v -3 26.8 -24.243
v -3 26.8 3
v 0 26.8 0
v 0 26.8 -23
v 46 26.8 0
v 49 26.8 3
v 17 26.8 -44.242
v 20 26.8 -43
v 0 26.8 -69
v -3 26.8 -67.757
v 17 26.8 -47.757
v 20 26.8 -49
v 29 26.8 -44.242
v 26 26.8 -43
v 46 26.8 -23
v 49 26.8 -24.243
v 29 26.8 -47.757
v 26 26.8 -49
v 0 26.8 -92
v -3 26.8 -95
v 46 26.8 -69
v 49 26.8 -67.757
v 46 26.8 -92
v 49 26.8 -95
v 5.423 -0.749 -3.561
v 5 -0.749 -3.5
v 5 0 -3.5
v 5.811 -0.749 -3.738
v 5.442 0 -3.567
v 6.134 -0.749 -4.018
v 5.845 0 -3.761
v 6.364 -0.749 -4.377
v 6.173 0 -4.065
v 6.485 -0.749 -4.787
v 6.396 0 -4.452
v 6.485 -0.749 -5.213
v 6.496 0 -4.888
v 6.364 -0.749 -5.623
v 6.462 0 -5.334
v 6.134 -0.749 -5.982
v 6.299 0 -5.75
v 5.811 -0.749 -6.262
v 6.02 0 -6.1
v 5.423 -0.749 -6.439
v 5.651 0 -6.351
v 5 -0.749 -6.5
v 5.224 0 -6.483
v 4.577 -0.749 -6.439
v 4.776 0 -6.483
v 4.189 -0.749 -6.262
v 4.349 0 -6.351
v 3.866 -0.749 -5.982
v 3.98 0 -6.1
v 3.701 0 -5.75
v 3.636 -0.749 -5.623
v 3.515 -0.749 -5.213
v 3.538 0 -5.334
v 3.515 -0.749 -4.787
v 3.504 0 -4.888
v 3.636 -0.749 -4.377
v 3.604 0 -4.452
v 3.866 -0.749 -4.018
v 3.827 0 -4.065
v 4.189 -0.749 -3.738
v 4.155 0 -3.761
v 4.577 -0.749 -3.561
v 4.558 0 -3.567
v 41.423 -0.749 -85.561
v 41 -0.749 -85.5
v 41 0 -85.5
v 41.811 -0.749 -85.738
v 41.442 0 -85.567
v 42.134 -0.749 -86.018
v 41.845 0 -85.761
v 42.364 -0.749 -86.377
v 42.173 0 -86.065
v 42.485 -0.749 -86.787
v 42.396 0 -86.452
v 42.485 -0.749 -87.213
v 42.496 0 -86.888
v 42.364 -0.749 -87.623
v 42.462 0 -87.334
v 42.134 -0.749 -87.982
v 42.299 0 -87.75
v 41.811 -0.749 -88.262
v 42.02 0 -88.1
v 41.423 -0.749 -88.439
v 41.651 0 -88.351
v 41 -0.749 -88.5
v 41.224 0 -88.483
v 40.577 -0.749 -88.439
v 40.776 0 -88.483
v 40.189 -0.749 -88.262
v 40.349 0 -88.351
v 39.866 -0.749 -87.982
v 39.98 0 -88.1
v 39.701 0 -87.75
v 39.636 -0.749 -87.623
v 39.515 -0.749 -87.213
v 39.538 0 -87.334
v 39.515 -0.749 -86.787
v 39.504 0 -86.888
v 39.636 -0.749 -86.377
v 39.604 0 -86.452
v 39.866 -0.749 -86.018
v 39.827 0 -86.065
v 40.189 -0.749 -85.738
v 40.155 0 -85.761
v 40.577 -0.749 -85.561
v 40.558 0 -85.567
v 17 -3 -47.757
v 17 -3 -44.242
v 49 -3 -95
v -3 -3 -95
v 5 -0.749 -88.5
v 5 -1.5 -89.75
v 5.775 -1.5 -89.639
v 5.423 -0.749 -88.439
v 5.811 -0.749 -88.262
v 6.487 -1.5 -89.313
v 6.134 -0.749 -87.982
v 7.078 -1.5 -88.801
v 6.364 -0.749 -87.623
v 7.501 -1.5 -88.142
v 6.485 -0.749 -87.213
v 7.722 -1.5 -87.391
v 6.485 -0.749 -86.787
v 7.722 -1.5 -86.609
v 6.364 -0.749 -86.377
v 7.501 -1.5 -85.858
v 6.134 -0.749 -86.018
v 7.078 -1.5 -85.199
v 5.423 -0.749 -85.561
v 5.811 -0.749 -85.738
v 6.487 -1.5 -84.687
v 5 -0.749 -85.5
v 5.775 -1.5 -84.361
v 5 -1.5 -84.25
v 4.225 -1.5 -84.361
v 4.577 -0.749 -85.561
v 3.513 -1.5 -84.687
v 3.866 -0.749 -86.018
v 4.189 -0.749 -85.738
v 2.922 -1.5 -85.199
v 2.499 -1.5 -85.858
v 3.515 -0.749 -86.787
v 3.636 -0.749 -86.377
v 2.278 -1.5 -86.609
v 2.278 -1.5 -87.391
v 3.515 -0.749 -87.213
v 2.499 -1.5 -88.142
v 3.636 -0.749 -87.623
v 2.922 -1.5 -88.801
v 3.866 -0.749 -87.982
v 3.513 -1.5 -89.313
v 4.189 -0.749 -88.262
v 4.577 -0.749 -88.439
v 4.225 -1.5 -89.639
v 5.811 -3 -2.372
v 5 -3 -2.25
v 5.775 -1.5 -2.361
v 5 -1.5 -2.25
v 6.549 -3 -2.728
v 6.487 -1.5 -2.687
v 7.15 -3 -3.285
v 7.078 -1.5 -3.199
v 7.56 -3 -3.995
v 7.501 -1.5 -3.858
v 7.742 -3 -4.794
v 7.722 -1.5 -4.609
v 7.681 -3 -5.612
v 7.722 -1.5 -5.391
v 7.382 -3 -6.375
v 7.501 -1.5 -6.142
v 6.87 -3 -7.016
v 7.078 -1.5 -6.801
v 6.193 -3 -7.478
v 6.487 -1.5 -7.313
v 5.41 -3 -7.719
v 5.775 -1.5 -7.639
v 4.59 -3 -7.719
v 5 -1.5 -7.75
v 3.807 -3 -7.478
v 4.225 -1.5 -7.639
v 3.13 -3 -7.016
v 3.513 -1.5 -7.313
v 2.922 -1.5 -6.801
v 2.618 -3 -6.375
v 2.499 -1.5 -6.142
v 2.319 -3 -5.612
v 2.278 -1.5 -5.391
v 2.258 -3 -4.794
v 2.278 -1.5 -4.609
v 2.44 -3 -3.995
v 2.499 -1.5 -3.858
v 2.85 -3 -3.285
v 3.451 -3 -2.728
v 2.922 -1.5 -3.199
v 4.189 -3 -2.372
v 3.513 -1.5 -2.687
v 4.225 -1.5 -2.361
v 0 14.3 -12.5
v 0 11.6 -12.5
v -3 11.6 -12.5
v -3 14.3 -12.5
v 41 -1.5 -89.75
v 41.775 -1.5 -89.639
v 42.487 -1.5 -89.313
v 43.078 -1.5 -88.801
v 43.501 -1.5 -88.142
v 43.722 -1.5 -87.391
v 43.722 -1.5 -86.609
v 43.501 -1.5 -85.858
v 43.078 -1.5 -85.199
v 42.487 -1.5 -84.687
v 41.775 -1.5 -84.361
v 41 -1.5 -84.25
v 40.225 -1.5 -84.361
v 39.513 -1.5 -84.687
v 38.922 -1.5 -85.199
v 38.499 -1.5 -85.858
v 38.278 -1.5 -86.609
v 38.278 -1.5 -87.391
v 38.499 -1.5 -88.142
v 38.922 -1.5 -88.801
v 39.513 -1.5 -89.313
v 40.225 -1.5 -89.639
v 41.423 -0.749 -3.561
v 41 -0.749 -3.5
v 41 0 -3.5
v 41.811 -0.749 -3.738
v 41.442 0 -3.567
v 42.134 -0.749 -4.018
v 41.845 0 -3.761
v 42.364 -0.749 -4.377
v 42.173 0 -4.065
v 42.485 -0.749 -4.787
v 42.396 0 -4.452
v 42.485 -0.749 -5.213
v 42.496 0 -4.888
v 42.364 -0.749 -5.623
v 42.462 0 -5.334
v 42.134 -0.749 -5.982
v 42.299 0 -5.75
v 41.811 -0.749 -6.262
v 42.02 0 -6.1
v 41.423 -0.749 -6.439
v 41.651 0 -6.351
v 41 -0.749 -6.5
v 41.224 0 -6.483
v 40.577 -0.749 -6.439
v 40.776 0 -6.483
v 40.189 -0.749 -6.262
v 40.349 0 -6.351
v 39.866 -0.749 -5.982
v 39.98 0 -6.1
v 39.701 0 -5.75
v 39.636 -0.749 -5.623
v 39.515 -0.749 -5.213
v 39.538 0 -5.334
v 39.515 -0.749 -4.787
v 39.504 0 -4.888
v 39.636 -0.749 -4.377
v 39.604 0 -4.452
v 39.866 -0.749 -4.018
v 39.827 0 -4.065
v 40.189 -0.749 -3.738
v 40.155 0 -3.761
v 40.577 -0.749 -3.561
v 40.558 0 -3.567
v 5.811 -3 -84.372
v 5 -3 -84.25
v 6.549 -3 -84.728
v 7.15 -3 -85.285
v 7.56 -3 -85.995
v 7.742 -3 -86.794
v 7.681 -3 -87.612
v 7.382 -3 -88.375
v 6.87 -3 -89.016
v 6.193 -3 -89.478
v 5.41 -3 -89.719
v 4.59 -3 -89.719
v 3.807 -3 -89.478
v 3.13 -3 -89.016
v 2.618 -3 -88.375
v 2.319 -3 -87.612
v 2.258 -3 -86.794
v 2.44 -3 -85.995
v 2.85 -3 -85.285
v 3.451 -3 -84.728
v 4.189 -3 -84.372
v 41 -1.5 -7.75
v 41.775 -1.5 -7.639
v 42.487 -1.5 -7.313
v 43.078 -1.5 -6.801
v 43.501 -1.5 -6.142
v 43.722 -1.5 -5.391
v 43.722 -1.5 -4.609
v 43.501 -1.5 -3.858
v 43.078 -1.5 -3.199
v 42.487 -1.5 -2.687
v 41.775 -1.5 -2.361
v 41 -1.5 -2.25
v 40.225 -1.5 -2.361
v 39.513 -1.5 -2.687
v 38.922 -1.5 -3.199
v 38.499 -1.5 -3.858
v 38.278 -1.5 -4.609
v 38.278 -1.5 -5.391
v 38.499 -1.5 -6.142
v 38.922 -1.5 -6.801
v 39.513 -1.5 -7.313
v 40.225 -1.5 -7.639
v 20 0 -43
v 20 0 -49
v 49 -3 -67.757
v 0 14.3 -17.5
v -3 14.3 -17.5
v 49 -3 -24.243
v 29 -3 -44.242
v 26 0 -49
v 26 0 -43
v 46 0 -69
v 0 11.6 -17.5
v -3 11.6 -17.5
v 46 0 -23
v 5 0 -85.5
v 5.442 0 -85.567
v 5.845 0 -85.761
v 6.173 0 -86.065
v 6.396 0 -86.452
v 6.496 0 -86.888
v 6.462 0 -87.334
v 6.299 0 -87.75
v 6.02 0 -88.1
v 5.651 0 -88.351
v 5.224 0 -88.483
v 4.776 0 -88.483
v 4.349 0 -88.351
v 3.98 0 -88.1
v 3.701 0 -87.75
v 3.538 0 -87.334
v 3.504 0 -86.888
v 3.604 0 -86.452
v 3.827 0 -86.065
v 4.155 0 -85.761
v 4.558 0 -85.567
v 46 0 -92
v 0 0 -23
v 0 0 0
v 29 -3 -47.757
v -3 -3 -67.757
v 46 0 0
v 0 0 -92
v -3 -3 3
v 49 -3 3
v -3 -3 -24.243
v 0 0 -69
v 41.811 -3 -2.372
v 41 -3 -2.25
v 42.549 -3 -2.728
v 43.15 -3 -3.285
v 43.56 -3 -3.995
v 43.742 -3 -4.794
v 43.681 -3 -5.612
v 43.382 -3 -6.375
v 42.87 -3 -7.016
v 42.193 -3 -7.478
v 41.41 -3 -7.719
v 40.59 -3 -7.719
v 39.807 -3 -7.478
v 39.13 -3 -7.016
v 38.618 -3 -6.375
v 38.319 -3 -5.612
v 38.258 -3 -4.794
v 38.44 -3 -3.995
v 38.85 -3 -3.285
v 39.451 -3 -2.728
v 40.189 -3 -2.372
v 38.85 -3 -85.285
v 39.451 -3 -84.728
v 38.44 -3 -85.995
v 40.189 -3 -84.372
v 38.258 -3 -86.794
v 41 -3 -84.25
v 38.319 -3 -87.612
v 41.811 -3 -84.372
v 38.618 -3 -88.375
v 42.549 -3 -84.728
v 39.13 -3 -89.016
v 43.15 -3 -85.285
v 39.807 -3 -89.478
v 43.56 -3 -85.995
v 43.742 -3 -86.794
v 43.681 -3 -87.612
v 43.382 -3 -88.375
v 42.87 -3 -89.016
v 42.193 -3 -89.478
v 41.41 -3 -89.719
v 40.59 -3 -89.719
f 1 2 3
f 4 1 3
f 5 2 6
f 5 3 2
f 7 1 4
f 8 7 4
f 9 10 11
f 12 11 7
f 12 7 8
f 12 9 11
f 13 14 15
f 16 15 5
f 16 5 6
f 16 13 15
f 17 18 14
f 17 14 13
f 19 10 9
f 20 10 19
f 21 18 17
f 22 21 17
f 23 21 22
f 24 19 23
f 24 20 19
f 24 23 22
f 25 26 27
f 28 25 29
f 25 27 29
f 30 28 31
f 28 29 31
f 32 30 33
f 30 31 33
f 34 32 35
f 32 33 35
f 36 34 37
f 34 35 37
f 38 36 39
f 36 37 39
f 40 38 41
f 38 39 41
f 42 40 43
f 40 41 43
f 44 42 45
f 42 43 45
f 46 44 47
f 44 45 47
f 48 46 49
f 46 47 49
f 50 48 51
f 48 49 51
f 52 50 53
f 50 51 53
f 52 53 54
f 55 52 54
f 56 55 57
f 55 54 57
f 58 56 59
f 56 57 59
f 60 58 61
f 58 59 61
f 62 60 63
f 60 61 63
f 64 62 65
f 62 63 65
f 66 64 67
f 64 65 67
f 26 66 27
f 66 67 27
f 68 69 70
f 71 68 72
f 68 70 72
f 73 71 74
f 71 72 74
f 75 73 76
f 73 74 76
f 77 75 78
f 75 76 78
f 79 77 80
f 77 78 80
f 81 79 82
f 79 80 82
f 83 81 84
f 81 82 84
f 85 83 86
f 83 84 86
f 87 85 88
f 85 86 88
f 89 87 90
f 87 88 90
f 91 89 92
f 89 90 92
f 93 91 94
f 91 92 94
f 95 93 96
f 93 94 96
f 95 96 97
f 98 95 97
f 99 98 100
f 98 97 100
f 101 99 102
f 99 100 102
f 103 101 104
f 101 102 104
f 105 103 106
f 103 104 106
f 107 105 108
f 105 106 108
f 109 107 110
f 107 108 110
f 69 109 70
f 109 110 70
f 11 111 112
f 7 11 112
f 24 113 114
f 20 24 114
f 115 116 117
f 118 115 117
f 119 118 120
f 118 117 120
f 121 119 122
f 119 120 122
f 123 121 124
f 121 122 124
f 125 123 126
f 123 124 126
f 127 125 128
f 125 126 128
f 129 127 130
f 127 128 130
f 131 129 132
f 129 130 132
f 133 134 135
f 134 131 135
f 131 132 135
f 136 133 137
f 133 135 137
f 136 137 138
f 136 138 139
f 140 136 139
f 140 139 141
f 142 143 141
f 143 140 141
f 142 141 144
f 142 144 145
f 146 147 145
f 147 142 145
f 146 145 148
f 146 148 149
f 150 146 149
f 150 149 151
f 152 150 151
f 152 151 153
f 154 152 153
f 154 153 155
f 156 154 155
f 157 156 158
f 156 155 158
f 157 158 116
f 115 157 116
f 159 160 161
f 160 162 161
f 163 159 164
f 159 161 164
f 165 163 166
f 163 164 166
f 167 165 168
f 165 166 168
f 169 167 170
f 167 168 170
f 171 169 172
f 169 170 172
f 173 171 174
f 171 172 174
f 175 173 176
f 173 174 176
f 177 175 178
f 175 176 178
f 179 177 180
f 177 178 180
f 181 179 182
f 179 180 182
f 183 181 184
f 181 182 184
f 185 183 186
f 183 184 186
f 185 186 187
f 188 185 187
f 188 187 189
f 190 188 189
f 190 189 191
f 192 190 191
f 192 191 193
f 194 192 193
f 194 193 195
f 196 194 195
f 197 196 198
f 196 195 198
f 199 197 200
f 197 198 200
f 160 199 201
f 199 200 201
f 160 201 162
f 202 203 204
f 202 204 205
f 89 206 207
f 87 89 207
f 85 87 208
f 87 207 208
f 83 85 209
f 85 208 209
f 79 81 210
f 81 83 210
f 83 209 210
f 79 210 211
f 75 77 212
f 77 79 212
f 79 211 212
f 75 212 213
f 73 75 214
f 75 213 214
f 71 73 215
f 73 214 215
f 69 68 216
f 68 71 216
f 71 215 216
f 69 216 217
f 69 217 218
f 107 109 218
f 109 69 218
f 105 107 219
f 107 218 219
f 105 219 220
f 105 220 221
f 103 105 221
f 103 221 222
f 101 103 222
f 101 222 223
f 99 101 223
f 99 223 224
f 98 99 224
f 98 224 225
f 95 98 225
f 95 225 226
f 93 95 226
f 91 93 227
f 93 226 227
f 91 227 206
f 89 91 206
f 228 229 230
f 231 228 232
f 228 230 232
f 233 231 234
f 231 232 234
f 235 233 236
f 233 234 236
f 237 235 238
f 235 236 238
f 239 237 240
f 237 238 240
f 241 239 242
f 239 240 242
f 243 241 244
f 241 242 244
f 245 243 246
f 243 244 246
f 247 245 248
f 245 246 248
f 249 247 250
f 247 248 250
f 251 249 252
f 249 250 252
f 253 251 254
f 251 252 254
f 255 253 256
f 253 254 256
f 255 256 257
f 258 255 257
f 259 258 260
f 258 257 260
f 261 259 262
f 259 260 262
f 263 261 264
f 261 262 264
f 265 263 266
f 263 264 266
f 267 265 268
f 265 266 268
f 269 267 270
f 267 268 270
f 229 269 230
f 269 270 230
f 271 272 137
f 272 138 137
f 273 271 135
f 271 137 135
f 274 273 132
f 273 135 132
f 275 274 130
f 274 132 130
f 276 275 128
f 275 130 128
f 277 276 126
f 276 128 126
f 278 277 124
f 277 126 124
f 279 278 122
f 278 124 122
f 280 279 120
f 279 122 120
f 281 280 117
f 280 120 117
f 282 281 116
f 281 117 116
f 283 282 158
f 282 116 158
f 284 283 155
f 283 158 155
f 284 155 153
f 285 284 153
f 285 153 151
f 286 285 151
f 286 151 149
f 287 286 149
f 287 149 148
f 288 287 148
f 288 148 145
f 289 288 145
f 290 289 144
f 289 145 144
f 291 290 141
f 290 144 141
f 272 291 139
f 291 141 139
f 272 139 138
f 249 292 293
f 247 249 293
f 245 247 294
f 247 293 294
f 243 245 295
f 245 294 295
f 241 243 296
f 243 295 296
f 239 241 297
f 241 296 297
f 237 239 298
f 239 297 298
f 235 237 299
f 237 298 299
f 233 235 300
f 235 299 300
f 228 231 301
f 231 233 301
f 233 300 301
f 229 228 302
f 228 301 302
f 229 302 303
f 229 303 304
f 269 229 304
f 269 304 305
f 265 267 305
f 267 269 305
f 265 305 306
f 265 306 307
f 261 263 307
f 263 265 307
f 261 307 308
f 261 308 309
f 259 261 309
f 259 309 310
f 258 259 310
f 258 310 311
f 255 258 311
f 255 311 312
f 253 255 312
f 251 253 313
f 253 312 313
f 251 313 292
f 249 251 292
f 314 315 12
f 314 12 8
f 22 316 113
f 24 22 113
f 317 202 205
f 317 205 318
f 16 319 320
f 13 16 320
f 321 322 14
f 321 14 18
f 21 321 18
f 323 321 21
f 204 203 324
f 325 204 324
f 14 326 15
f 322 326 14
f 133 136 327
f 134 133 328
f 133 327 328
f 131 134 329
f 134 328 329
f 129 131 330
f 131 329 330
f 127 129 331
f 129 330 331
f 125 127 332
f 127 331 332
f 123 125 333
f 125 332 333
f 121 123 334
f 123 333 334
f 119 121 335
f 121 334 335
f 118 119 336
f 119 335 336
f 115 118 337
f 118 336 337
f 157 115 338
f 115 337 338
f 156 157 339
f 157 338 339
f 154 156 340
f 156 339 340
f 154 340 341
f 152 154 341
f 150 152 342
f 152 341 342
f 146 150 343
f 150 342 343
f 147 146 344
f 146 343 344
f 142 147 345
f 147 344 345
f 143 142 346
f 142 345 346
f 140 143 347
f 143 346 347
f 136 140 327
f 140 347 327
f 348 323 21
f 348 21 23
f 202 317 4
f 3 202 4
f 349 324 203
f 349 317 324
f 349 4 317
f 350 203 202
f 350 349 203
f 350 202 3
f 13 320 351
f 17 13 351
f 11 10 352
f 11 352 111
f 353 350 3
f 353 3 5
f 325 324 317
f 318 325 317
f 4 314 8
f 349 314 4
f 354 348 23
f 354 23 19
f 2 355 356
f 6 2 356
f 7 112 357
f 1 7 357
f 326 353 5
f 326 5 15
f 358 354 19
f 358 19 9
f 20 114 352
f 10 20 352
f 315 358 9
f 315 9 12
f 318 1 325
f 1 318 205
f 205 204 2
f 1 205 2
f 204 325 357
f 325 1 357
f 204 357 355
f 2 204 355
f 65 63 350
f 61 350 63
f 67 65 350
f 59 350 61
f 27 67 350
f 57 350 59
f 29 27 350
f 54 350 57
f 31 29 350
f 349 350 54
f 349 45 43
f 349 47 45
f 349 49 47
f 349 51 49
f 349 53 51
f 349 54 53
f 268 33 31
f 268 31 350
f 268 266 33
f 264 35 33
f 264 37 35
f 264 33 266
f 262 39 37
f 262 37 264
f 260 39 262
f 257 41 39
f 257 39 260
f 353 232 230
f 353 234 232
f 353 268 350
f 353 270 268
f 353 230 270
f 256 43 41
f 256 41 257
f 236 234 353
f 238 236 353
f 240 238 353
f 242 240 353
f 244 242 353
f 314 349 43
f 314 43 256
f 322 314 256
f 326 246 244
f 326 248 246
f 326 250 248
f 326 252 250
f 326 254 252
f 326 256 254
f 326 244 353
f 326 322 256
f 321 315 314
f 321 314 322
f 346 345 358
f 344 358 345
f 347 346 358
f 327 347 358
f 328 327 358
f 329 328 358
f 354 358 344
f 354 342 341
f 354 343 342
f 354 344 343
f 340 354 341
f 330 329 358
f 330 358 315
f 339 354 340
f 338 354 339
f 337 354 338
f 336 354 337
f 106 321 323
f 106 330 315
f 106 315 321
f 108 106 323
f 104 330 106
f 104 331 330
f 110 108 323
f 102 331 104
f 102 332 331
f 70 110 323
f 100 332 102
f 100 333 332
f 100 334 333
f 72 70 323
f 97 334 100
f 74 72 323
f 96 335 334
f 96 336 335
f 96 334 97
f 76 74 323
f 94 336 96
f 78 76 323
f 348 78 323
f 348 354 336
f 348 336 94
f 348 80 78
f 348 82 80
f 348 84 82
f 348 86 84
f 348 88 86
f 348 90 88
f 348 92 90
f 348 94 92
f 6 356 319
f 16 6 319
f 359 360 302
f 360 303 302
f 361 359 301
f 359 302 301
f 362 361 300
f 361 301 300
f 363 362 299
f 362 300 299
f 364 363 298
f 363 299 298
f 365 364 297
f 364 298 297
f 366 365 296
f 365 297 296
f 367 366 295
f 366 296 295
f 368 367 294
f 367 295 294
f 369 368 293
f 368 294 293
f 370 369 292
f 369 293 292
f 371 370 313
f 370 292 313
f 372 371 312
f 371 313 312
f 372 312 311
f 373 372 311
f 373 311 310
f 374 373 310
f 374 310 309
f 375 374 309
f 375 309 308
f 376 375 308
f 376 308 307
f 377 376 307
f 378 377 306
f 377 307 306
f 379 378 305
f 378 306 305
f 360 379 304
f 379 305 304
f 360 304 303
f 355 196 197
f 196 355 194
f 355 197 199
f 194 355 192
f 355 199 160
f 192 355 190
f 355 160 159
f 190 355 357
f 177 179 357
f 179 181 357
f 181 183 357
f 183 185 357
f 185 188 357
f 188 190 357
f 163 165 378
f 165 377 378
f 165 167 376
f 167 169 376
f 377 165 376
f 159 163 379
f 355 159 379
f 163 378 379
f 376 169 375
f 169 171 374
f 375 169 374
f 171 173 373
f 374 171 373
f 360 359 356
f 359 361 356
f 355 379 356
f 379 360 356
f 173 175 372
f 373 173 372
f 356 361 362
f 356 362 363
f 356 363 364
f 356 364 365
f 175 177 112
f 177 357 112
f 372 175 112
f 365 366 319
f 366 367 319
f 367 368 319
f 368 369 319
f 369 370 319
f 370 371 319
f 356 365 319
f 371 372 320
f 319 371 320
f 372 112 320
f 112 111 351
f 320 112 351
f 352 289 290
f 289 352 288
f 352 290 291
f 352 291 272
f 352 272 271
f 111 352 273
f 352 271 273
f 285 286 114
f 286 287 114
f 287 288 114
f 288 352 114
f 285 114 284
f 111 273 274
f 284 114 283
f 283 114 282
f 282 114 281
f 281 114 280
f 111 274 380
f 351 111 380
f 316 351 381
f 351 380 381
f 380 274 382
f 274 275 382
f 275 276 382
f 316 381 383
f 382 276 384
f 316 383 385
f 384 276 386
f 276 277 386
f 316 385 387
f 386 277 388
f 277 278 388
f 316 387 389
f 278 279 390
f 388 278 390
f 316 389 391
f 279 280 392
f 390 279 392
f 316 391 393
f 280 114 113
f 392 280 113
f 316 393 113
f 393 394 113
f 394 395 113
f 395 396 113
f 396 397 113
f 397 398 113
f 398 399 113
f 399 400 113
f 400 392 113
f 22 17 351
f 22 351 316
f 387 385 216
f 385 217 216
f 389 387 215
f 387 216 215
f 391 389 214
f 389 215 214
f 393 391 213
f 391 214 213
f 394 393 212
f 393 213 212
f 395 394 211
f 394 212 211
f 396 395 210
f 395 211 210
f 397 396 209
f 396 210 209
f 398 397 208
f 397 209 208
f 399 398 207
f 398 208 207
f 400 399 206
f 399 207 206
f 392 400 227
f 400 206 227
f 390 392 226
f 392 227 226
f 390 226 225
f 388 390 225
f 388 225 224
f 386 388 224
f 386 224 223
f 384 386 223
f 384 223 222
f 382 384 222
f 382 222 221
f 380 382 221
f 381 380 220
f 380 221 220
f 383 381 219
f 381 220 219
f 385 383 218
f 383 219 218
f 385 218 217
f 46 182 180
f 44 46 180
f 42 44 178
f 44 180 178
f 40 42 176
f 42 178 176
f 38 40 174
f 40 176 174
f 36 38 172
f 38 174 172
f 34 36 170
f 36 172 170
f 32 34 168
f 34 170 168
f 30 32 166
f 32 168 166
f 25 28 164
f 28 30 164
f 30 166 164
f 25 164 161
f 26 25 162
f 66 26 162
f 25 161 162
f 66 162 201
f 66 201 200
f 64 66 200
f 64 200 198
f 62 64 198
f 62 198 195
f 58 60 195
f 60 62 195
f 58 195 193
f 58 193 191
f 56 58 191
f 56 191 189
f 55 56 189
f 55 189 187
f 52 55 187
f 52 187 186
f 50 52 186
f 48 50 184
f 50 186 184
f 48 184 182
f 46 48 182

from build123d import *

# Parameters (mm, degrees)
EXTRUDE_2_DEPTH     = 26.8
SHELL_2_T           = 3
F_3_0MM_1_D         = 3
F_3_0MM_1_DEPTH     = 5
F_3_0MM_1_TIP       = 0.901290929
F_3_0MM_2_D         = 5.5
F_3_0MM_2_DEPTH     = 1.5
F_3_0MM_2_TIP       = 1.652366702
SKETCH_16_W         = 5
SKETCH_16_H         = 2.7
CUT_EXTRUDE_3_DEPTH = 10


with BuildPart() as part:
    # 草图2 → 凸台-拉伸2 (new body)
    with BuildSketch(Plane(origin=(0, 0, 0), x_dir=(1, 0, 0), z_dir=(0, 1, 0))):
        Polygon((0, 0), (46, 0), (46, 23), (26.000191801, 42.999808199), (26.000191801, 48.999808199), (46, 68.999616398), (46, 91.999616398), (0, 91.999616398), (0, 68.999616398), (19.999808199, 48.999808199), (19.999808199, 42.999808199), (0, 23), align=None)
    extrude(amount=EXTRUDE_2_DEPTH)

    # 抽壳2
    shell_2_openings = [part.faces().sort_by_distance(p)[0] for p in [
        (23, 26.8, -45.999808199),
    ]]
    offset(amount=SHELL_2_T, openings=shell_2_openings, kind=Kind.INTERSECTION)

    # Ø3.0mm 暗销孔1
    with Locations(Plane(origin=(5, -3, -5), x_dir=(0, 0, -1), z_dir=(0, -1, 0))):
        with Locations((0, 0), (0, 36), (82, 36), (82, 0)):
            Hole(F_3_0MM_1_D / 2, depth=F_3_0MM_1_DEPTH)
            with Locations((0, 0, -(F_3_0MM_1_DEPTH + F_3_0MM_1_TIP / 2))):  # 118° drill point
                Cone(0, F_3_0MM_1_D / 2, F_3_0MM_1_TIP, mode=Mode.SUBTRACT)

    # Ø3.0mm 暗销孔2
    with Locations(Plane(origin=(5, -3, -5), x_dir=(0, 0, -1), z_dir=(0, -1, 0))):
        with Locations((0, 0), (0, 36), (82, 36), (82, 0)):
            Hole(F_3_0MM_2_D / 2, depth=F_3_0MM_2_DEPTH)
            with Locations((0, 0, -(F_3_0MM_2_DEPTH + F_3_0MM_2_TIP / 2))):  # 118° drill point
                Cone(0, F_3_0MM_2_D / 2, F_3_0MM_2_TIP, mode=Mode.SUBTRACT)

    # 草图16 → 切除-拉伸3 (cut)
    with BuildSketch(Plane(origin=(0, 0, 0), x_dir=(0, 0, -1), z_dir=(1, 0, 0))):
        with Locations((15, 12.95)):
            Rectangle(SKETCH_16_W, SKETCH_16_H)
    extrude(amount=-CUT_EXTRUDE_3_DEPTH, mode=Mode.SUBTRACT)


solid = part.part
